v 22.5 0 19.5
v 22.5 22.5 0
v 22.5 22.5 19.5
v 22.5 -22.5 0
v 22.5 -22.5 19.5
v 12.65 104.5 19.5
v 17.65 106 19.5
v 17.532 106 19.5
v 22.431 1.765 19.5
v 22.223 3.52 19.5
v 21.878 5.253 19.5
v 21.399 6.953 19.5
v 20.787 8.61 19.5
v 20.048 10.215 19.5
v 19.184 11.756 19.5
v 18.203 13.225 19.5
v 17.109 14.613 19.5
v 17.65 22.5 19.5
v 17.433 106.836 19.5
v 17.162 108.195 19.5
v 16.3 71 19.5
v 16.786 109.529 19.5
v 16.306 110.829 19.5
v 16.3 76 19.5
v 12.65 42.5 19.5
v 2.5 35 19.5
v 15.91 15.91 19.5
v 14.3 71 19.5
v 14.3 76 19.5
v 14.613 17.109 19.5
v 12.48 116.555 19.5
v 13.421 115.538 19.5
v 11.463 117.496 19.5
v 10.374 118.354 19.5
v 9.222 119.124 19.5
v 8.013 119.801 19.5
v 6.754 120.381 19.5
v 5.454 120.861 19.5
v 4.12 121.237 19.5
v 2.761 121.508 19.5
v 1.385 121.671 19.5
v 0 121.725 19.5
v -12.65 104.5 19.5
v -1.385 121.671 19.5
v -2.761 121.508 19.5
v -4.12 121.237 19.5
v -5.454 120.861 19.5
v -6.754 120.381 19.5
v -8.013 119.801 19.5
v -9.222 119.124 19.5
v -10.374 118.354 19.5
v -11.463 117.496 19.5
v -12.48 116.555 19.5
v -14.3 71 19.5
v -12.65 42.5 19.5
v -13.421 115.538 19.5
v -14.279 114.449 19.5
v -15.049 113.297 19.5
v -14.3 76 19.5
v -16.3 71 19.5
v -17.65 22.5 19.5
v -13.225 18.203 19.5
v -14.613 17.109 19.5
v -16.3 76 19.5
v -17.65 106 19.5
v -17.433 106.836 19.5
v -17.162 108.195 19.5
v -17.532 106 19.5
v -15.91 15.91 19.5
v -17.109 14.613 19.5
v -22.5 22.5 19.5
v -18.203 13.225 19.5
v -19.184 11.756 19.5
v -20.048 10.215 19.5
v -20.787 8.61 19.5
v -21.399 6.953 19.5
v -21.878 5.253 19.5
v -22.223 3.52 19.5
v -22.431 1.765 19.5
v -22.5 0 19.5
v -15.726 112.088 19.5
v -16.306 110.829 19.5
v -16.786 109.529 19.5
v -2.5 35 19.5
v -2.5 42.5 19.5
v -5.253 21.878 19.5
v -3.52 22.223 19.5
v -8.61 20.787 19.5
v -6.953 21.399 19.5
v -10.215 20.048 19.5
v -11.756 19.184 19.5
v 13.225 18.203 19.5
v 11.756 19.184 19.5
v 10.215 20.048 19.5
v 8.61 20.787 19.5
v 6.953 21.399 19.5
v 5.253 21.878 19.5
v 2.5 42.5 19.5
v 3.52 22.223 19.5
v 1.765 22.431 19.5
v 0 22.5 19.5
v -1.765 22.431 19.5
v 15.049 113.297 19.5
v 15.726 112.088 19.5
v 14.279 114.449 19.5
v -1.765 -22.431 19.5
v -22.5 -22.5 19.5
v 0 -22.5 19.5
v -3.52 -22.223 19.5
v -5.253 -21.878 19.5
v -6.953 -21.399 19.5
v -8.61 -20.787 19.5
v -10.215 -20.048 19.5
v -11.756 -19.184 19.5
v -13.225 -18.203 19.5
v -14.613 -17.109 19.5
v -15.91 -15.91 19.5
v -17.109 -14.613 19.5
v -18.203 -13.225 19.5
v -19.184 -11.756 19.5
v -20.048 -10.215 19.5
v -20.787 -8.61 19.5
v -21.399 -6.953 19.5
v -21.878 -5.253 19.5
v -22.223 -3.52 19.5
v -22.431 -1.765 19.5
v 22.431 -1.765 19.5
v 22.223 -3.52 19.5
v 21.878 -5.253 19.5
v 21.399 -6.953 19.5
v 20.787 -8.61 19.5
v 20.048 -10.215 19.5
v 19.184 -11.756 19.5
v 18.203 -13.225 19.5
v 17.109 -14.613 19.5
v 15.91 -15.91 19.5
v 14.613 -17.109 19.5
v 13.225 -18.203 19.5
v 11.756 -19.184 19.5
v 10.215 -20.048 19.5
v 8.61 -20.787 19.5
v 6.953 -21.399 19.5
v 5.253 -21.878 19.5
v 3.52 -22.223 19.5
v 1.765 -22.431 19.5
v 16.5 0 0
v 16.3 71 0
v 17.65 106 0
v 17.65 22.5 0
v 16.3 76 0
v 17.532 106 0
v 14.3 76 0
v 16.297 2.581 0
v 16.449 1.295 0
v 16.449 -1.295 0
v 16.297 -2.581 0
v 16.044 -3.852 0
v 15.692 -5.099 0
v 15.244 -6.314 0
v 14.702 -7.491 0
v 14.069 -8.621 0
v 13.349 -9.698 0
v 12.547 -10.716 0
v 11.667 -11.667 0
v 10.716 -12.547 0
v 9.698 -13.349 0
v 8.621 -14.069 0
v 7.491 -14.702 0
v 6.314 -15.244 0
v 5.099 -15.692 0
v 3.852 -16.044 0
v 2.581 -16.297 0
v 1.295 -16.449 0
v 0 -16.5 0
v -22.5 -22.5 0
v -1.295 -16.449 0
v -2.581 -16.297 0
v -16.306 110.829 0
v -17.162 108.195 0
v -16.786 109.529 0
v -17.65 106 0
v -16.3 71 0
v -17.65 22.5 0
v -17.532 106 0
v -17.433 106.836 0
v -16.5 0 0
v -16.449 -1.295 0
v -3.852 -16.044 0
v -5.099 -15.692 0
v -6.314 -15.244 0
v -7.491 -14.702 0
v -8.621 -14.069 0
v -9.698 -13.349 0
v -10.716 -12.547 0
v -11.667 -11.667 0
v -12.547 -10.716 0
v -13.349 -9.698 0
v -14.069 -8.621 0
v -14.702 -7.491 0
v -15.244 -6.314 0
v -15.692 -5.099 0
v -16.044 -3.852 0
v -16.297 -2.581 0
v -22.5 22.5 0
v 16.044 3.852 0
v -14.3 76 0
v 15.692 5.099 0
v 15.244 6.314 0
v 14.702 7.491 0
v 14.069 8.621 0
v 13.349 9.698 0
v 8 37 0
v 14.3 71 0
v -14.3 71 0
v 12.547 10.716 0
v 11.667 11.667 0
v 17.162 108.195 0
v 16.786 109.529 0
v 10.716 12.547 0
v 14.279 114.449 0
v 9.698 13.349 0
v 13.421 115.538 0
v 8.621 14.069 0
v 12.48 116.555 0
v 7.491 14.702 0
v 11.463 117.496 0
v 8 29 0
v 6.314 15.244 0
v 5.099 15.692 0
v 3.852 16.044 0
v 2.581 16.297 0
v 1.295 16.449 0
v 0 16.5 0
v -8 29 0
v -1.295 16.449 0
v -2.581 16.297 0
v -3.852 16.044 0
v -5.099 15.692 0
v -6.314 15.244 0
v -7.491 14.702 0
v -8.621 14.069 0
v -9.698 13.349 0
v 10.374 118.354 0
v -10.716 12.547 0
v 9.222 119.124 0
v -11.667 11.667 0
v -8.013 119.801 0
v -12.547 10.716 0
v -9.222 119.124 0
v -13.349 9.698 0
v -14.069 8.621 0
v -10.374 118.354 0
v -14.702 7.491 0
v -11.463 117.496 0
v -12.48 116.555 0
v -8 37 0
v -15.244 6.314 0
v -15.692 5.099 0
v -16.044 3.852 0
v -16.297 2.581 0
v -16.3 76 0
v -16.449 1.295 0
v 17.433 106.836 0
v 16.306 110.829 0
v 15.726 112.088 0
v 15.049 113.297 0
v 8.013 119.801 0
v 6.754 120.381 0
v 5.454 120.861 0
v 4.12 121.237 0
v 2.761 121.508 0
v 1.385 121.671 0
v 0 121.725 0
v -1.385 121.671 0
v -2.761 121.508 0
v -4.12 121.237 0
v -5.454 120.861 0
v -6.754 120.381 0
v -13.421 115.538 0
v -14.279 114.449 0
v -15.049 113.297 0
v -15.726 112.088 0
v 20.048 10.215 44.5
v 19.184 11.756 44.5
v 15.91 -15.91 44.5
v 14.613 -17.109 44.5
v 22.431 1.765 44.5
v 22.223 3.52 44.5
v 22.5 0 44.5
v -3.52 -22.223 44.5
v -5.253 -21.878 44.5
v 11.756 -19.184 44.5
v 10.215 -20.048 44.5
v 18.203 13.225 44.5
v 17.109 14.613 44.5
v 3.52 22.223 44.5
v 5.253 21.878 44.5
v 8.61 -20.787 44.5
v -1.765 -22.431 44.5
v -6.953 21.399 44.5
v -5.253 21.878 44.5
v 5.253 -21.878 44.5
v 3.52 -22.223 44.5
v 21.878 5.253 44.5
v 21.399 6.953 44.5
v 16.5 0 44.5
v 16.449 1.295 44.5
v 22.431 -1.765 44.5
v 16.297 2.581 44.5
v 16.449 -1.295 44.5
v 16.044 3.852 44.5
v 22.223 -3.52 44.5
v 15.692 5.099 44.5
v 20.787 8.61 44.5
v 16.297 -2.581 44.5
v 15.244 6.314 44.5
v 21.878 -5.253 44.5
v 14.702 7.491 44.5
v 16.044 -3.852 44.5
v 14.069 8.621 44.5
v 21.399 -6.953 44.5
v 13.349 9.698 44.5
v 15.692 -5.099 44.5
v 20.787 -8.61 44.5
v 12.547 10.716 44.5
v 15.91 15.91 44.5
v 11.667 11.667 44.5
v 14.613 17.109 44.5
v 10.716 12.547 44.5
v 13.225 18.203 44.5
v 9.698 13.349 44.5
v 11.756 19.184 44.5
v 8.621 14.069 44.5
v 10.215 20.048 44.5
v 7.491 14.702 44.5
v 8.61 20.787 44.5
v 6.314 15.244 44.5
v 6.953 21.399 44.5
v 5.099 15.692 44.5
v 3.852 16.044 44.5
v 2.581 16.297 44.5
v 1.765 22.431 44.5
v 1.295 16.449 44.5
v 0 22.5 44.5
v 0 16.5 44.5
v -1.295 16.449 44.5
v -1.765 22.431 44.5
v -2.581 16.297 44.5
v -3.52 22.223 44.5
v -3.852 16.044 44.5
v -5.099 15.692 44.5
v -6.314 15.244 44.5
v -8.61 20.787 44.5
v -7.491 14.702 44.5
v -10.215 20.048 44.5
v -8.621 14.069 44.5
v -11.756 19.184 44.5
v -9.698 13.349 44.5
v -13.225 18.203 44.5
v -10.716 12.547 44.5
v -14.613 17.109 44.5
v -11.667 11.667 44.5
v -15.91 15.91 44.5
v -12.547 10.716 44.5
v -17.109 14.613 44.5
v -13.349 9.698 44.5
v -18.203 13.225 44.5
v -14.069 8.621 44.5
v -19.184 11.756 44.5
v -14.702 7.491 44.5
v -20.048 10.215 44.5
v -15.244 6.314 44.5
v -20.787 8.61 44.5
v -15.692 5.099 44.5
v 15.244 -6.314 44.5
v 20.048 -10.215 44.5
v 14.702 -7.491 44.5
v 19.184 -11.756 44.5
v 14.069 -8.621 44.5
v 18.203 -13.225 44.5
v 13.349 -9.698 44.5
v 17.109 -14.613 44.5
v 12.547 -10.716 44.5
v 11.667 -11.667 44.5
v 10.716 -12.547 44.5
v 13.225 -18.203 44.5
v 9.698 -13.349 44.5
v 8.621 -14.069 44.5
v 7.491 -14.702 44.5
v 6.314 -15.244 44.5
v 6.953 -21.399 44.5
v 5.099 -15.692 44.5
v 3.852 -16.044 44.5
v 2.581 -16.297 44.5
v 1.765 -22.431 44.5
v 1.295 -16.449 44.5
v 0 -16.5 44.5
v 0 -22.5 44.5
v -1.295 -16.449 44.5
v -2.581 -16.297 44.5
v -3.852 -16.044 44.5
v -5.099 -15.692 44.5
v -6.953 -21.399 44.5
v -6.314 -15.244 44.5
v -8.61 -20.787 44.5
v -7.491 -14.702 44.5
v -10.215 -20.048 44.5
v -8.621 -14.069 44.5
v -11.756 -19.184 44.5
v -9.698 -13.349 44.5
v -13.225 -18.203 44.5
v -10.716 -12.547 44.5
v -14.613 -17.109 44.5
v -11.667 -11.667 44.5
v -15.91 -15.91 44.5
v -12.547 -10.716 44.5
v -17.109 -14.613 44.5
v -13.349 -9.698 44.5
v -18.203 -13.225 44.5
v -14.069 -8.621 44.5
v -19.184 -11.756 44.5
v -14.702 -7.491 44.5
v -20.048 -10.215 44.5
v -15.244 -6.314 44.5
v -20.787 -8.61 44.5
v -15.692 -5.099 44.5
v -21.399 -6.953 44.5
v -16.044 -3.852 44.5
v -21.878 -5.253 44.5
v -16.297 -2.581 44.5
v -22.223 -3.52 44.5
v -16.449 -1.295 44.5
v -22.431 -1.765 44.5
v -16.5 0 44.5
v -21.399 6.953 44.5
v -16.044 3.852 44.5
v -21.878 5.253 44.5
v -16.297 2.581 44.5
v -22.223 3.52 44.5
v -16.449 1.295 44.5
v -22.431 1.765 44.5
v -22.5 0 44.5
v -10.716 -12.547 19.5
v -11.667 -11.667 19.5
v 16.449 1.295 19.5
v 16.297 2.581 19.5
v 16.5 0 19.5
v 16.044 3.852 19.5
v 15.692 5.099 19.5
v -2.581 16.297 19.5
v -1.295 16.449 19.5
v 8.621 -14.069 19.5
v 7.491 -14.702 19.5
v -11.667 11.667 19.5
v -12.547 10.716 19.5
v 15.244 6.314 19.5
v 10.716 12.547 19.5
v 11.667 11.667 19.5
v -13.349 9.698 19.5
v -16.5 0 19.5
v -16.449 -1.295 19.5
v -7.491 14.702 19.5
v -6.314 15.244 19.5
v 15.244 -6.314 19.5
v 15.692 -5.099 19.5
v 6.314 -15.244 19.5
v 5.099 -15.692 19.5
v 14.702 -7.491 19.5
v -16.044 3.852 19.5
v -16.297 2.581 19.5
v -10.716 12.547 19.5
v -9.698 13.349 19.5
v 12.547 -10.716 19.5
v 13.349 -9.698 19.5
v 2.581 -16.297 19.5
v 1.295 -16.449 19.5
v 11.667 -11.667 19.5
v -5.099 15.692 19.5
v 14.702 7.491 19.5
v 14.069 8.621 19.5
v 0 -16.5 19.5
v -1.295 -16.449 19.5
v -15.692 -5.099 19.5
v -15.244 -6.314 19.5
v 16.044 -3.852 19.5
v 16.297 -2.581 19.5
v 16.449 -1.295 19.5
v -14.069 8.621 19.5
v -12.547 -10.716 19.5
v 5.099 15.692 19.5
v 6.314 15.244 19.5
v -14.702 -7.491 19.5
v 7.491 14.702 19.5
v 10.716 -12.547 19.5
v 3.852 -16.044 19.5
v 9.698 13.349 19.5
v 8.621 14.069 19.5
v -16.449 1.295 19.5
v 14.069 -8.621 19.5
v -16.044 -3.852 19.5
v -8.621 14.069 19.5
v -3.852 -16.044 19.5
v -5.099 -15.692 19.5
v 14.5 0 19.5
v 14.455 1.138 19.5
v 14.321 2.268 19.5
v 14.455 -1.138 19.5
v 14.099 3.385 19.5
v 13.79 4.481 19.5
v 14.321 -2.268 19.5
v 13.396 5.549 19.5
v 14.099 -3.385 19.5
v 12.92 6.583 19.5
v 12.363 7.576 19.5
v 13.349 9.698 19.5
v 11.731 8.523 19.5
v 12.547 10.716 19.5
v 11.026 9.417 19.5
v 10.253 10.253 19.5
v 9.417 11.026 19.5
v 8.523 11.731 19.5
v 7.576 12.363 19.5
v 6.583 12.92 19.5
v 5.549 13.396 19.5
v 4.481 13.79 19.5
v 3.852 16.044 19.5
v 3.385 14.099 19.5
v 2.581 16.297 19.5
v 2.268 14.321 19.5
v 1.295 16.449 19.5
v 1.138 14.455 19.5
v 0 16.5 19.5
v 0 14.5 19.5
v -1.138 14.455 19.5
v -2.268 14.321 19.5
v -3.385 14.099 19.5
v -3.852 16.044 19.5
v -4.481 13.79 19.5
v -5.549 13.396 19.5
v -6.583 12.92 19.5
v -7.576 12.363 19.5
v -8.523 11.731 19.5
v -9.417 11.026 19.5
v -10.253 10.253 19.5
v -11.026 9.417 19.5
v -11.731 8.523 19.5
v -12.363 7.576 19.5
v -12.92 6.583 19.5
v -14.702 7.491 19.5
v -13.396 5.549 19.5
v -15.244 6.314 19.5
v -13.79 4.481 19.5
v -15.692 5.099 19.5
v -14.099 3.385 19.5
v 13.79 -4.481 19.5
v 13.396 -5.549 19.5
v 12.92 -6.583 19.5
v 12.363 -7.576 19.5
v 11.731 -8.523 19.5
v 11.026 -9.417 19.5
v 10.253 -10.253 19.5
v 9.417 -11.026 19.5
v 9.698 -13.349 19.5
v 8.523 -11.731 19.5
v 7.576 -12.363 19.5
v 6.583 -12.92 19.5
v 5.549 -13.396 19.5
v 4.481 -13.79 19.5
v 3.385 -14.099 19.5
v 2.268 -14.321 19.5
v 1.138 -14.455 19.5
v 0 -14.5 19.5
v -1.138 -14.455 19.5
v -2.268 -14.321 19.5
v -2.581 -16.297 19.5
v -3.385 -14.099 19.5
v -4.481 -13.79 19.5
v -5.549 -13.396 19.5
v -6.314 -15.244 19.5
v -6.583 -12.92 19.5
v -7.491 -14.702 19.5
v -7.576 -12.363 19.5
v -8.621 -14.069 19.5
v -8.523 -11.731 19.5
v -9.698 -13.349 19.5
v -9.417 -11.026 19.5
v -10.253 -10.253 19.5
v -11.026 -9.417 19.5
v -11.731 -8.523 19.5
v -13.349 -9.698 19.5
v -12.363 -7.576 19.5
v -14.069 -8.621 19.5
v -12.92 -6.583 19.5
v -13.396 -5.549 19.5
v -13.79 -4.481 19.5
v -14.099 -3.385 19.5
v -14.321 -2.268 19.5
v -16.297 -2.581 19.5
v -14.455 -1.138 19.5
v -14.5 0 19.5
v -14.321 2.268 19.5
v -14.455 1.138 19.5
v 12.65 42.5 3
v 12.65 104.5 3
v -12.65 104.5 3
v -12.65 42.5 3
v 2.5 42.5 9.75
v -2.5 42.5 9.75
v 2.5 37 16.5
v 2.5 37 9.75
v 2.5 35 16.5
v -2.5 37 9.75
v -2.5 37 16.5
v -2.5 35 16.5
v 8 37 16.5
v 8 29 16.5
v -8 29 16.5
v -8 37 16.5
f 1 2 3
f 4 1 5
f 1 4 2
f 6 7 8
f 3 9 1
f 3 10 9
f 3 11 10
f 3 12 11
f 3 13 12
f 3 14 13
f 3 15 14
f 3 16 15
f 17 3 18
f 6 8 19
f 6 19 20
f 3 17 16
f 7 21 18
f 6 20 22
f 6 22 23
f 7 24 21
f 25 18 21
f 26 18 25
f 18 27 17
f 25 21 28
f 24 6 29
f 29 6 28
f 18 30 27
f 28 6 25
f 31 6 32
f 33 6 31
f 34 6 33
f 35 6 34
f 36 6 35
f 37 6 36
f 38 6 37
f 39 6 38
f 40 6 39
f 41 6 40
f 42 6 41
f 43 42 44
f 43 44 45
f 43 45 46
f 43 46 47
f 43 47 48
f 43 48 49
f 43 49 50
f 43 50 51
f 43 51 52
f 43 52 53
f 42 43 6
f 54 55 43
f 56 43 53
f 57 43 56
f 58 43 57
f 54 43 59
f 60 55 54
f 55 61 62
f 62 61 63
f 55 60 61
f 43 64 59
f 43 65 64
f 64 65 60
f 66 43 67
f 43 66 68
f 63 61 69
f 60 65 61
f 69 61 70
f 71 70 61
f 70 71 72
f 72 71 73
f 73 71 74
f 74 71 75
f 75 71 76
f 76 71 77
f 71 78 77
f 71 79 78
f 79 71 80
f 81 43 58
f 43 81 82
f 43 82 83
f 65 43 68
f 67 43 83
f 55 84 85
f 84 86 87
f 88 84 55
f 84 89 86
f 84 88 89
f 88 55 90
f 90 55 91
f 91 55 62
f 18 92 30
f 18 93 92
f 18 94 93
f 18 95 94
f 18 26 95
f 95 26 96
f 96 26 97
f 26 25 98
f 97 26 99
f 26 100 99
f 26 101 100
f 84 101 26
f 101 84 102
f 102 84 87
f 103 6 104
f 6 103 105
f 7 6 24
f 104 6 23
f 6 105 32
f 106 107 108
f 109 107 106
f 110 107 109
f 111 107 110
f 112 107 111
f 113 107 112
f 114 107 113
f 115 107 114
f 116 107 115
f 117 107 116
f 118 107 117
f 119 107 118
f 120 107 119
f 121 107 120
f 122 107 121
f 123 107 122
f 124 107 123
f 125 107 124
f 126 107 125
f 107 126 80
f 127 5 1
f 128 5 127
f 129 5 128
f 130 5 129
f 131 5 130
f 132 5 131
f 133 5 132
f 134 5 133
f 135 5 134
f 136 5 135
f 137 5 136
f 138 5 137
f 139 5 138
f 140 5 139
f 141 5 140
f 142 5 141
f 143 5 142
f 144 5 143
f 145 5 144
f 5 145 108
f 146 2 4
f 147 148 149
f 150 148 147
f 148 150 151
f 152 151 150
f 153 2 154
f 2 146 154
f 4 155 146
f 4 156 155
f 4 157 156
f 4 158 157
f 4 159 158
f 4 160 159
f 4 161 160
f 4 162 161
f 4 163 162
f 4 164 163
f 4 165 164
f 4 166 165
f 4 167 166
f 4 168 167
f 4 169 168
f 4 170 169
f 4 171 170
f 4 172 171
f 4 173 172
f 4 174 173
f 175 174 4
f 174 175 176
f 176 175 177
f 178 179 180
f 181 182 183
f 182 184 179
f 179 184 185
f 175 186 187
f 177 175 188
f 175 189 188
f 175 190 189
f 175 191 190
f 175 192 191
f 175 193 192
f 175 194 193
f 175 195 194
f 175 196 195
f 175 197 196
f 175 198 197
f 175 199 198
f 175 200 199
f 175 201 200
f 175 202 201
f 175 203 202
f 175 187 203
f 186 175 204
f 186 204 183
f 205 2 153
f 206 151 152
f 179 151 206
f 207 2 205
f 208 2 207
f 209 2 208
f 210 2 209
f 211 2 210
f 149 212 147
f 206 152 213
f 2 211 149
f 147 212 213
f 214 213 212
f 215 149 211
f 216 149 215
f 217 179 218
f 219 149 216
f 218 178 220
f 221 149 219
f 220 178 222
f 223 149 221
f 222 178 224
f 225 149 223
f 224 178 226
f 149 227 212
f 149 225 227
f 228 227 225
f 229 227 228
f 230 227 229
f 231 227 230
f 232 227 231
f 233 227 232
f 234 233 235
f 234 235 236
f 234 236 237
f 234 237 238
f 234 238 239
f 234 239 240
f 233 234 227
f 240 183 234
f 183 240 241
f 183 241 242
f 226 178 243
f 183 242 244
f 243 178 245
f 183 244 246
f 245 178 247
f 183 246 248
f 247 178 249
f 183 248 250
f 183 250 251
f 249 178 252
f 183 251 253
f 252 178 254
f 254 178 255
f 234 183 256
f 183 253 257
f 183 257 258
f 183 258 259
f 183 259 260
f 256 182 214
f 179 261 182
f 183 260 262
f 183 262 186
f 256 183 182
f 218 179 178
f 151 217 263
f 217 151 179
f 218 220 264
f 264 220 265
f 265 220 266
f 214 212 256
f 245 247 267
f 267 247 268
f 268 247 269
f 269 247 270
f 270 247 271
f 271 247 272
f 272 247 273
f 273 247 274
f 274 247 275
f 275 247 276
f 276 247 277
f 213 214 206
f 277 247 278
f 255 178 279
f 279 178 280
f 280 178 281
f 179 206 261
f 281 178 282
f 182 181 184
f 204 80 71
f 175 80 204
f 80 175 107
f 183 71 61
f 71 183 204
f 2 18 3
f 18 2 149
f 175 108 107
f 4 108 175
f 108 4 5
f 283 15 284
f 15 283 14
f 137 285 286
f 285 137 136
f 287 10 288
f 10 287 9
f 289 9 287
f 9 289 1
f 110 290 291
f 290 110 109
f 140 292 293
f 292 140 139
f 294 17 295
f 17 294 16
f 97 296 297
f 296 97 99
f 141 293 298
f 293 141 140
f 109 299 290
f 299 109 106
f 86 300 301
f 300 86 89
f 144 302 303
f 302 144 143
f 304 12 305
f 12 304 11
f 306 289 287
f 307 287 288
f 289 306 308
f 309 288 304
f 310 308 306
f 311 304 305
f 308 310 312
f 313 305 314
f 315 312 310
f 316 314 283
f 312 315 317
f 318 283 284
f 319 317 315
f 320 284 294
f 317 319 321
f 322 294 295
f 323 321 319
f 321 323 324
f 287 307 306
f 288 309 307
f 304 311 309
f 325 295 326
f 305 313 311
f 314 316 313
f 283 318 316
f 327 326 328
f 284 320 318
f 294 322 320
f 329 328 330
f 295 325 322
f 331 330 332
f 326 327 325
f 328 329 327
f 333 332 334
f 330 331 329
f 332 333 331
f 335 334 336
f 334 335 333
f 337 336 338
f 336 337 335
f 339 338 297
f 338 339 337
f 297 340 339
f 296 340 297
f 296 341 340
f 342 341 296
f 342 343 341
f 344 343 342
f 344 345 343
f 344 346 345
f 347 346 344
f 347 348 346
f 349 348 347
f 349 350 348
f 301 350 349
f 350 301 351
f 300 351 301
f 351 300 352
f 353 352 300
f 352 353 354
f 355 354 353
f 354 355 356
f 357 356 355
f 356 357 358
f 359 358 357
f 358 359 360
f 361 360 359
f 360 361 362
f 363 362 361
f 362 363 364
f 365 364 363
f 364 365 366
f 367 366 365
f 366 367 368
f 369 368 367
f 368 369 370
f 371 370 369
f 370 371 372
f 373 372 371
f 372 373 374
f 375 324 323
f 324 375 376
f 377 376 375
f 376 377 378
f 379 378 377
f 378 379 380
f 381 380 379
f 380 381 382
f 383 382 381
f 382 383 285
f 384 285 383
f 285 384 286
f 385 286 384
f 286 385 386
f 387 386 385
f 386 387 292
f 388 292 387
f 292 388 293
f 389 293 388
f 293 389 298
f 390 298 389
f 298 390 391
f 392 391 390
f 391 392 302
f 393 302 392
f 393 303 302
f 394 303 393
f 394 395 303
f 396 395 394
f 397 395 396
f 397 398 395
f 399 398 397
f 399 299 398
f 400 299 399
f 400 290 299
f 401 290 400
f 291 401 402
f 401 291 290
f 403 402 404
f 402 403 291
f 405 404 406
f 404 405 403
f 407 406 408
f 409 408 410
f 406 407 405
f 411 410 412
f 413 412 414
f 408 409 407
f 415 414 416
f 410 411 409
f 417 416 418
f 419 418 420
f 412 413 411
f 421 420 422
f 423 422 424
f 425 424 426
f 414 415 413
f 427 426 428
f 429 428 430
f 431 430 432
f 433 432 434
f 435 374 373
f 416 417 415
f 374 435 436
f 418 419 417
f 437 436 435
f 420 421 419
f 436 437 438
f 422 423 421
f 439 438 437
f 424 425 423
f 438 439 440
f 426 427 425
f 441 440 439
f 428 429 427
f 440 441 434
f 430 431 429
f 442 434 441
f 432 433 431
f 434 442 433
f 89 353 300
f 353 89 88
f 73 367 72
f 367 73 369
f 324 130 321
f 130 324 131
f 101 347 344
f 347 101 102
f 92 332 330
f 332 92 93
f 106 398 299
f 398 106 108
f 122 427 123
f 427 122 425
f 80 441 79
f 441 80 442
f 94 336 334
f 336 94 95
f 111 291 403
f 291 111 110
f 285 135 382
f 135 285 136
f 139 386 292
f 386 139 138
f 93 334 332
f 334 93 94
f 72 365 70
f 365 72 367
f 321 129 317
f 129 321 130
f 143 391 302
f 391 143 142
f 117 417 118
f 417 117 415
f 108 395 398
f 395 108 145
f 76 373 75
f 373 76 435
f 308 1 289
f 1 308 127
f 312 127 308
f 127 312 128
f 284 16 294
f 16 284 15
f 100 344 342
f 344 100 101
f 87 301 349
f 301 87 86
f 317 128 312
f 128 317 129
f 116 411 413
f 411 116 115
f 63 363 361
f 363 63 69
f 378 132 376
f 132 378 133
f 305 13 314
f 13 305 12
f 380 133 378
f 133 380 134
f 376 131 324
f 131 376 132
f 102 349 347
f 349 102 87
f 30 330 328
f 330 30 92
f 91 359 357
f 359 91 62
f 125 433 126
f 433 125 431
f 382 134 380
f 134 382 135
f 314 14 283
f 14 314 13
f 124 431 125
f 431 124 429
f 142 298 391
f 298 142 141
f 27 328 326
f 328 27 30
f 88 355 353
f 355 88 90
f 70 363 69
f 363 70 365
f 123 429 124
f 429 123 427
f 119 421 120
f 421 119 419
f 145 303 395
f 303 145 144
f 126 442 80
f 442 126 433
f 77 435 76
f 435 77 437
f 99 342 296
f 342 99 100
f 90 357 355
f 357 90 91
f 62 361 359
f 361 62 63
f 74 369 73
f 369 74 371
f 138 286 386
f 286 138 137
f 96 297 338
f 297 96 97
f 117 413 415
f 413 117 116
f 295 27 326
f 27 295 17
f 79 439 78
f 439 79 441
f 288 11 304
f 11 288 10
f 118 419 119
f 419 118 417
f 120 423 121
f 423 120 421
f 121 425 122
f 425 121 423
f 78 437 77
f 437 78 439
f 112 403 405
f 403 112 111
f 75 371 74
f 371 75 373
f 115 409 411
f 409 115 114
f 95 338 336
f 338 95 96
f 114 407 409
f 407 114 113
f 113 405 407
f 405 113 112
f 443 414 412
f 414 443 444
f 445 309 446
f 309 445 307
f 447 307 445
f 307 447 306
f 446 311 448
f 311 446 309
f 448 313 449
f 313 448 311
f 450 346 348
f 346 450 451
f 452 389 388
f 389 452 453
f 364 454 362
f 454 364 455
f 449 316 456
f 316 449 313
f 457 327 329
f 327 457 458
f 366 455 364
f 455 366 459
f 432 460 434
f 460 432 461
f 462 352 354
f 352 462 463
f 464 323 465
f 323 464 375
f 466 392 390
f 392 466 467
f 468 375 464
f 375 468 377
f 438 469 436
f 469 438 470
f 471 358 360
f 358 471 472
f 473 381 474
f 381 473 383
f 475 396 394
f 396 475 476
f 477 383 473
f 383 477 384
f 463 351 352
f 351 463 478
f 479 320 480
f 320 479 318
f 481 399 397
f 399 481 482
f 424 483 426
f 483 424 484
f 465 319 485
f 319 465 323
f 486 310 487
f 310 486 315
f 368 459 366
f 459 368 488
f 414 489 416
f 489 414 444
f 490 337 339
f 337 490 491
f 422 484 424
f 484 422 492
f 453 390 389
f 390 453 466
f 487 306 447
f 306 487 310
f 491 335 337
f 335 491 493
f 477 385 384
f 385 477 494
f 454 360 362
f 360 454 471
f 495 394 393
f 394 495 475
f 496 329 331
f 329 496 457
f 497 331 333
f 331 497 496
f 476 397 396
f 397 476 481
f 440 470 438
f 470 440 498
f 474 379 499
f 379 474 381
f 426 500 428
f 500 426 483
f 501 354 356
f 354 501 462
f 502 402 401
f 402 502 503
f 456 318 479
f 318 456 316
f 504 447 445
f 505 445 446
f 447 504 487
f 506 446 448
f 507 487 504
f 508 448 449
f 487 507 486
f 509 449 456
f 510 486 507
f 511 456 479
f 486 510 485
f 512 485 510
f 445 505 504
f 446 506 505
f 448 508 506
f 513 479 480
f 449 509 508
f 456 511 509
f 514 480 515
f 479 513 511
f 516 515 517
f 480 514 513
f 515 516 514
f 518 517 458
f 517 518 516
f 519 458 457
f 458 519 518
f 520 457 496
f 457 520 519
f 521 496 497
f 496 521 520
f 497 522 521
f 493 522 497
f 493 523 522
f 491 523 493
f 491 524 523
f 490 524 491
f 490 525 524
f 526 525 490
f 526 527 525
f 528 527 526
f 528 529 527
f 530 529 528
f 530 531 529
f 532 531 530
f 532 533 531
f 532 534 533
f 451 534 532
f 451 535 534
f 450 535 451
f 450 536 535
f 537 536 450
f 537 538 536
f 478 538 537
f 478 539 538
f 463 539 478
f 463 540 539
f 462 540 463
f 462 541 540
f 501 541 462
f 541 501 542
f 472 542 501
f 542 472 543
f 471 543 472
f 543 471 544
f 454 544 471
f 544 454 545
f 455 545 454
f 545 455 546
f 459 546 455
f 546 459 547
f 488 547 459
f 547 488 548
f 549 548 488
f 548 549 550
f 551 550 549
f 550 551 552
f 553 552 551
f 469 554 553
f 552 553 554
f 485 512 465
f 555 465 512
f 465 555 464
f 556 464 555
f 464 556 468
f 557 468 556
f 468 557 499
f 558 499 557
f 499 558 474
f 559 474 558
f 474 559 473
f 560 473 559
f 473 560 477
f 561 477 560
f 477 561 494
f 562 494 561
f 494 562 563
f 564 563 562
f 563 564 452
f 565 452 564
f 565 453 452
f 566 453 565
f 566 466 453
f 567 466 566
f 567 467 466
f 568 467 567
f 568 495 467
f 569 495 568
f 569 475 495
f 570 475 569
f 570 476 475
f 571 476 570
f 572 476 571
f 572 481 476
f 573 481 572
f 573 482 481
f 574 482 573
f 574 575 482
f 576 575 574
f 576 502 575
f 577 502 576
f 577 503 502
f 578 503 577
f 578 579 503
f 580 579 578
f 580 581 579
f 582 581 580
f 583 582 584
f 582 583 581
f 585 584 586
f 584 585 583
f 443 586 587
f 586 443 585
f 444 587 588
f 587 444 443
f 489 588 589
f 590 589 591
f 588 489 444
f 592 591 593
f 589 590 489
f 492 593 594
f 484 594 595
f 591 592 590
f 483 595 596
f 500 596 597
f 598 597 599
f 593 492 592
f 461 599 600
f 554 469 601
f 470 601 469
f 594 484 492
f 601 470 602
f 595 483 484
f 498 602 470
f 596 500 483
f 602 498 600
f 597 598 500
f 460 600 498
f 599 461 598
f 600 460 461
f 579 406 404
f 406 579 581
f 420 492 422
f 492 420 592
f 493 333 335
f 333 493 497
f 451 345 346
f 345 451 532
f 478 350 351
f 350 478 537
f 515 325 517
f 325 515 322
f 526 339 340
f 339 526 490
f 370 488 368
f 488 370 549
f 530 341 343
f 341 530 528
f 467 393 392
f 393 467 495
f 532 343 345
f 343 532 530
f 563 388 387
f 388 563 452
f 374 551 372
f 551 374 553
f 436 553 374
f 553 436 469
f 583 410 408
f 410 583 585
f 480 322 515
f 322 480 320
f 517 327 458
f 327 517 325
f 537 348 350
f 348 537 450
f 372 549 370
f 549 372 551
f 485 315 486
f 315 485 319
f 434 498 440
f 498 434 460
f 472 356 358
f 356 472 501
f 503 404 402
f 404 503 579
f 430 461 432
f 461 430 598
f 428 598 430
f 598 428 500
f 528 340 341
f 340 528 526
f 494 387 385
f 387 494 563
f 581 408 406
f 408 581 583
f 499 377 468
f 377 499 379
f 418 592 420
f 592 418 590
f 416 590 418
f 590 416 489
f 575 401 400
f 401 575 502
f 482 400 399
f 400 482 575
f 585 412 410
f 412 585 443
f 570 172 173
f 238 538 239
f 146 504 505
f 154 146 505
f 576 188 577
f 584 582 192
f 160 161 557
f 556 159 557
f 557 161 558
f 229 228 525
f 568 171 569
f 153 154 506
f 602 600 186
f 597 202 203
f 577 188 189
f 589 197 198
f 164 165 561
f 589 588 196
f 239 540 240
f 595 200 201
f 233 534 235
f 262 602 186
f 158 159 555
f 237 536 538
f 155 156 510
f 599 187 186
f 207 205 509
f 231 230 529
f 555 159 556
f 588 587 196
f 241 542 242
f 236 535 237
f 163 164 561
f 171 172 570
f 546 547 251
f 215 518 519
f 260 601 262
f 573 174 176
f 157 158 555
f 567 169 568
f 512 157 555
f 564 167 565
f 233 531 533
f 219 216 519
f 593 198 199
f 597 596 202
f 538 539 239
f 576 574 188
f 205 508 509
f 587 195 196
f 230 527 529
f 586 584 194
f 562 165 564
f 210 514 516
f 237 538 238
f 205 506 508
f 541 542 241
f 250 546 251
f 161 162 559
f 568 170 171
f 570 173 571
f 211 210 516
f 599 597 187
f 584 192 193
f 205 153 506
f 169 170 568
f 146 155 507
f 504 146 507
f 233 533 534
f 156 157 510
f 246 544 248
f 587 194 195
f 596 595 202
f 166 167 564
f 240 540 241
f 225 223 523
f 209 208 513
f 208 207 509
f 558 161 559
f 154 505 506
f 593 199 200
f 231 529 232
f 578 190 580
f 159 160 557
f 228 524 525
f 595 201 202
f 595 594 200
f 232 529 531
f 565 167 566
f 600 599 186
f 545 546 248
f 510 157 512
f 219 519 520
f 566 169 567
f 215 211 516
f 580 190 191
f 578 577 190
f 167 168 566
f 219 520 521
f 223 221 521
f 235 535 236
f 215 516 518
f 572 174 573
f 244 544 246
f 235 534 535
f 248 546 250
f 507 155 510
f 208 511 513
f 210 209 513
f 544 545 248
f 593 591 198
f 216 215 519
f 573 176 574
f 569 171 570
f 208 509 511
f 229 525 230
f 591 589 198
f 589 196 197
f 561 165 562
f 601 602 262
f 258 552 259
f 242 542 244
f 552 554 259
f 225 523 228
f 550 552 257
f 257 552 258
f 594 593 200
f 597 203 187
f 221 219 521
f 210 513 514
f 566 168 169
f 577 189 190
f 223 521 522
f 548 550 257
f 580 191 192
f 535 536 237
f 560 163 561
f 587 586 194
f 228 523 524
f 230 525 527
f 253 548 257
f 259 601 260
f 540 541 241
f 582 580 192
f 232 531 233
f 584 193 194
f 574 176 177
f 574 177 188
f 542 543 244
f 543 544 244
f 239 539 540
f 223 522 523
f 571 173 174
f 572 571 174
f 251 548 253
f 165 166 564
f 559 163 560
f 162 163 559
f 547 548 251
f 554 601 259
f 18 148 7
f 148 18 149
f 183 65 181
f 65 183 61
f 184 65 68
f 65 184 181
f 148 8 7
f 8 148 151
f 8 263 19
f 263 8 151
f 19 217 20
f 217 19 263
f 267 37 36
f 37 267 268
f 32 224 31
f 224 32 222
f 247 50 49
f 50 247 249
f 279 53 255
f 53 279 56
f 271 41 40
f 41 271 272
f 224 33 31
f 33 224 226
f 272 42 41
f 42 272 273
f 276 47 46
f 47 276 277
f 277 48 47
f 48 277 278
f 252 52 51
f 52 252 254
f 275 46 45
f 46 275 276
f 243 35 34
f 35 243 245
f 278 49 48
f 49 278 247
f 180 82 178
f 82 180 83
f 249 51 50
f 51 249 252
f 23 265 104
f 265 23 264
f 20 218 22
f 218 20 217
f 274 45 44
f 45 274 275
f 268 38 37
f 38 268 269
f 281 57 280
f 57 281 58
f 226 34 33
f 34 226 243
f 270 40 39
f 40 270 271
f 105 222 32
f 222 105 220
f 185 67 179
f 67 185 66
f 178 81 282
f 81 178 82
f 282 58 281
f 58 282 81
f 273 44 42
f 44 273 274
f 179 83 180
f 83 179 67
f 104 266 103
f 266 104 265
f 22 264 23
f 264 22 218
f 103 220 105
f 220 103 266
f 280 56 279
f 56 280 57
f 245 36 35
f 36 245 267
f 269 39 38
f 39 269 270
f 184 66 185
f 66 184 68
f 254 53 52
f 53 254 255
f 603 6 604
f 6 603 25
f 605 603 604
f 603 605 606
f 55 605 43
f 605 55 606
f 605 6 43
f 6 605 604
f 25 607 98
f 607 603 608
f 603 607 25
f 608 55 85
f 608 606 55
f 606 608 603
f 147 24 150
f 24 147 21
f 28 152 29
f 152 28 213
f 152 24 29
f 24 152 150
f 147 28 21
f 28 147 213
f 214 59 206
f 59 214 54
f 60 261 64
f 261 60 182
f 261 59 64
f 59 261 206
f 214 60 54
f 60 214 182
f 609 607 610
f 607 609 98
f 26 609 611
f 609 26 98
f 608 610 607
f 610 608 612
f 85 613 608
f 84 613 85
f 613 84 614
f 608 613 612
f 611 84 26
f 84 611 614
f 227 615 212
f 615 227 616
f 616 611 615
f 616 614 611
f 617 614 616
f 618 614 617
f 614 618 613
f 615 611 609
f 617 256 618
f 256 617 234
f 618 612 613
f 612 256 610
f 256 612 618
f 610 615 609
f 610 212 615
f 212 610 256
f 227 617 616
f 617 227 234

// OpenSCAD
add_battery_holder=true;
pipe_diameter=33;
fan_size=40;
battery_depth=16.5;
battery_width=25.3;
battery_height=52;
block_height=battery_depth + 3;
//block_height=16.5;

module fan_blower(){
difference(){
union(){
//create fan block
translate([0,0,block_height/2]) cube([fan_size+5,fan_size+5,block_height], center=true);
//add top shroud
translate([0,0,block_height]) cylinder(r=(fan_size+5)/2,h=25,$fn=80);
}
//create tube mount
translate([0,0,block_height]) cylinder(r=pipe_diameter/2,25,$fn=80);
//create air path
cylinder(r1=pipe_diameter/2,r2=(pipe_diameter-4)/2,29/2,h=block_height,$fn=80);
}
}


//create battery holder
module battery_holder(){
difference(){
union(){
//create main battery block bigger than battery dimensions
translate([0,((fan_size/2)+(battery_height/2)+(pipe_diameter/2)),block_height/2]) cube([battery_width+10,battery_height+35,block_height],center=true);

//add rounded end to it
translate([0,(fan_size/2+battery_height+10)+((battery_width/2+2.5)/2)+(pipe_diameter/2)-2,block_height/2]) cylinder(r=battery_width/2+5,h=battery_depth+3,$fn=80,center=true);
}

//take away battery recess
translate([0,(fan_size+5/2)+battery_height/2+5,block_height/2+1.5]) cube([battery_width,battery_height+10,battery_depth], center=true);

//create some slots for cable_tie
translate([(battery_width-10),(fan_size+5/2)+(battery_height/2)+5,block_height]) cube([2,5,block_height*2],center=true);
translate([(battery_width-(battery_width*2)+10),(fan_size+5/2)+(battery_height/2)+5,block_height]) cube([2,5,block_height*2],center=true);

//create a cable channel
//battery_height+30
translate([0,fan_size/2+20,block_height/2+5]) cube([5,10,10], center=true);

//create pocket for switch
translate([0,fan_size/2+13,battery_depth/2]) cube([16,8,block_height-3], center=true);
//translate([0,fan_size/2+13,battery_depth/2]) cube([23.3,7.6,2], center=true);

}
}

if (add_battery_holder==true)
{
union(){
fan_blower();
battery_holder();
}
} else {
fan_blower();
}
